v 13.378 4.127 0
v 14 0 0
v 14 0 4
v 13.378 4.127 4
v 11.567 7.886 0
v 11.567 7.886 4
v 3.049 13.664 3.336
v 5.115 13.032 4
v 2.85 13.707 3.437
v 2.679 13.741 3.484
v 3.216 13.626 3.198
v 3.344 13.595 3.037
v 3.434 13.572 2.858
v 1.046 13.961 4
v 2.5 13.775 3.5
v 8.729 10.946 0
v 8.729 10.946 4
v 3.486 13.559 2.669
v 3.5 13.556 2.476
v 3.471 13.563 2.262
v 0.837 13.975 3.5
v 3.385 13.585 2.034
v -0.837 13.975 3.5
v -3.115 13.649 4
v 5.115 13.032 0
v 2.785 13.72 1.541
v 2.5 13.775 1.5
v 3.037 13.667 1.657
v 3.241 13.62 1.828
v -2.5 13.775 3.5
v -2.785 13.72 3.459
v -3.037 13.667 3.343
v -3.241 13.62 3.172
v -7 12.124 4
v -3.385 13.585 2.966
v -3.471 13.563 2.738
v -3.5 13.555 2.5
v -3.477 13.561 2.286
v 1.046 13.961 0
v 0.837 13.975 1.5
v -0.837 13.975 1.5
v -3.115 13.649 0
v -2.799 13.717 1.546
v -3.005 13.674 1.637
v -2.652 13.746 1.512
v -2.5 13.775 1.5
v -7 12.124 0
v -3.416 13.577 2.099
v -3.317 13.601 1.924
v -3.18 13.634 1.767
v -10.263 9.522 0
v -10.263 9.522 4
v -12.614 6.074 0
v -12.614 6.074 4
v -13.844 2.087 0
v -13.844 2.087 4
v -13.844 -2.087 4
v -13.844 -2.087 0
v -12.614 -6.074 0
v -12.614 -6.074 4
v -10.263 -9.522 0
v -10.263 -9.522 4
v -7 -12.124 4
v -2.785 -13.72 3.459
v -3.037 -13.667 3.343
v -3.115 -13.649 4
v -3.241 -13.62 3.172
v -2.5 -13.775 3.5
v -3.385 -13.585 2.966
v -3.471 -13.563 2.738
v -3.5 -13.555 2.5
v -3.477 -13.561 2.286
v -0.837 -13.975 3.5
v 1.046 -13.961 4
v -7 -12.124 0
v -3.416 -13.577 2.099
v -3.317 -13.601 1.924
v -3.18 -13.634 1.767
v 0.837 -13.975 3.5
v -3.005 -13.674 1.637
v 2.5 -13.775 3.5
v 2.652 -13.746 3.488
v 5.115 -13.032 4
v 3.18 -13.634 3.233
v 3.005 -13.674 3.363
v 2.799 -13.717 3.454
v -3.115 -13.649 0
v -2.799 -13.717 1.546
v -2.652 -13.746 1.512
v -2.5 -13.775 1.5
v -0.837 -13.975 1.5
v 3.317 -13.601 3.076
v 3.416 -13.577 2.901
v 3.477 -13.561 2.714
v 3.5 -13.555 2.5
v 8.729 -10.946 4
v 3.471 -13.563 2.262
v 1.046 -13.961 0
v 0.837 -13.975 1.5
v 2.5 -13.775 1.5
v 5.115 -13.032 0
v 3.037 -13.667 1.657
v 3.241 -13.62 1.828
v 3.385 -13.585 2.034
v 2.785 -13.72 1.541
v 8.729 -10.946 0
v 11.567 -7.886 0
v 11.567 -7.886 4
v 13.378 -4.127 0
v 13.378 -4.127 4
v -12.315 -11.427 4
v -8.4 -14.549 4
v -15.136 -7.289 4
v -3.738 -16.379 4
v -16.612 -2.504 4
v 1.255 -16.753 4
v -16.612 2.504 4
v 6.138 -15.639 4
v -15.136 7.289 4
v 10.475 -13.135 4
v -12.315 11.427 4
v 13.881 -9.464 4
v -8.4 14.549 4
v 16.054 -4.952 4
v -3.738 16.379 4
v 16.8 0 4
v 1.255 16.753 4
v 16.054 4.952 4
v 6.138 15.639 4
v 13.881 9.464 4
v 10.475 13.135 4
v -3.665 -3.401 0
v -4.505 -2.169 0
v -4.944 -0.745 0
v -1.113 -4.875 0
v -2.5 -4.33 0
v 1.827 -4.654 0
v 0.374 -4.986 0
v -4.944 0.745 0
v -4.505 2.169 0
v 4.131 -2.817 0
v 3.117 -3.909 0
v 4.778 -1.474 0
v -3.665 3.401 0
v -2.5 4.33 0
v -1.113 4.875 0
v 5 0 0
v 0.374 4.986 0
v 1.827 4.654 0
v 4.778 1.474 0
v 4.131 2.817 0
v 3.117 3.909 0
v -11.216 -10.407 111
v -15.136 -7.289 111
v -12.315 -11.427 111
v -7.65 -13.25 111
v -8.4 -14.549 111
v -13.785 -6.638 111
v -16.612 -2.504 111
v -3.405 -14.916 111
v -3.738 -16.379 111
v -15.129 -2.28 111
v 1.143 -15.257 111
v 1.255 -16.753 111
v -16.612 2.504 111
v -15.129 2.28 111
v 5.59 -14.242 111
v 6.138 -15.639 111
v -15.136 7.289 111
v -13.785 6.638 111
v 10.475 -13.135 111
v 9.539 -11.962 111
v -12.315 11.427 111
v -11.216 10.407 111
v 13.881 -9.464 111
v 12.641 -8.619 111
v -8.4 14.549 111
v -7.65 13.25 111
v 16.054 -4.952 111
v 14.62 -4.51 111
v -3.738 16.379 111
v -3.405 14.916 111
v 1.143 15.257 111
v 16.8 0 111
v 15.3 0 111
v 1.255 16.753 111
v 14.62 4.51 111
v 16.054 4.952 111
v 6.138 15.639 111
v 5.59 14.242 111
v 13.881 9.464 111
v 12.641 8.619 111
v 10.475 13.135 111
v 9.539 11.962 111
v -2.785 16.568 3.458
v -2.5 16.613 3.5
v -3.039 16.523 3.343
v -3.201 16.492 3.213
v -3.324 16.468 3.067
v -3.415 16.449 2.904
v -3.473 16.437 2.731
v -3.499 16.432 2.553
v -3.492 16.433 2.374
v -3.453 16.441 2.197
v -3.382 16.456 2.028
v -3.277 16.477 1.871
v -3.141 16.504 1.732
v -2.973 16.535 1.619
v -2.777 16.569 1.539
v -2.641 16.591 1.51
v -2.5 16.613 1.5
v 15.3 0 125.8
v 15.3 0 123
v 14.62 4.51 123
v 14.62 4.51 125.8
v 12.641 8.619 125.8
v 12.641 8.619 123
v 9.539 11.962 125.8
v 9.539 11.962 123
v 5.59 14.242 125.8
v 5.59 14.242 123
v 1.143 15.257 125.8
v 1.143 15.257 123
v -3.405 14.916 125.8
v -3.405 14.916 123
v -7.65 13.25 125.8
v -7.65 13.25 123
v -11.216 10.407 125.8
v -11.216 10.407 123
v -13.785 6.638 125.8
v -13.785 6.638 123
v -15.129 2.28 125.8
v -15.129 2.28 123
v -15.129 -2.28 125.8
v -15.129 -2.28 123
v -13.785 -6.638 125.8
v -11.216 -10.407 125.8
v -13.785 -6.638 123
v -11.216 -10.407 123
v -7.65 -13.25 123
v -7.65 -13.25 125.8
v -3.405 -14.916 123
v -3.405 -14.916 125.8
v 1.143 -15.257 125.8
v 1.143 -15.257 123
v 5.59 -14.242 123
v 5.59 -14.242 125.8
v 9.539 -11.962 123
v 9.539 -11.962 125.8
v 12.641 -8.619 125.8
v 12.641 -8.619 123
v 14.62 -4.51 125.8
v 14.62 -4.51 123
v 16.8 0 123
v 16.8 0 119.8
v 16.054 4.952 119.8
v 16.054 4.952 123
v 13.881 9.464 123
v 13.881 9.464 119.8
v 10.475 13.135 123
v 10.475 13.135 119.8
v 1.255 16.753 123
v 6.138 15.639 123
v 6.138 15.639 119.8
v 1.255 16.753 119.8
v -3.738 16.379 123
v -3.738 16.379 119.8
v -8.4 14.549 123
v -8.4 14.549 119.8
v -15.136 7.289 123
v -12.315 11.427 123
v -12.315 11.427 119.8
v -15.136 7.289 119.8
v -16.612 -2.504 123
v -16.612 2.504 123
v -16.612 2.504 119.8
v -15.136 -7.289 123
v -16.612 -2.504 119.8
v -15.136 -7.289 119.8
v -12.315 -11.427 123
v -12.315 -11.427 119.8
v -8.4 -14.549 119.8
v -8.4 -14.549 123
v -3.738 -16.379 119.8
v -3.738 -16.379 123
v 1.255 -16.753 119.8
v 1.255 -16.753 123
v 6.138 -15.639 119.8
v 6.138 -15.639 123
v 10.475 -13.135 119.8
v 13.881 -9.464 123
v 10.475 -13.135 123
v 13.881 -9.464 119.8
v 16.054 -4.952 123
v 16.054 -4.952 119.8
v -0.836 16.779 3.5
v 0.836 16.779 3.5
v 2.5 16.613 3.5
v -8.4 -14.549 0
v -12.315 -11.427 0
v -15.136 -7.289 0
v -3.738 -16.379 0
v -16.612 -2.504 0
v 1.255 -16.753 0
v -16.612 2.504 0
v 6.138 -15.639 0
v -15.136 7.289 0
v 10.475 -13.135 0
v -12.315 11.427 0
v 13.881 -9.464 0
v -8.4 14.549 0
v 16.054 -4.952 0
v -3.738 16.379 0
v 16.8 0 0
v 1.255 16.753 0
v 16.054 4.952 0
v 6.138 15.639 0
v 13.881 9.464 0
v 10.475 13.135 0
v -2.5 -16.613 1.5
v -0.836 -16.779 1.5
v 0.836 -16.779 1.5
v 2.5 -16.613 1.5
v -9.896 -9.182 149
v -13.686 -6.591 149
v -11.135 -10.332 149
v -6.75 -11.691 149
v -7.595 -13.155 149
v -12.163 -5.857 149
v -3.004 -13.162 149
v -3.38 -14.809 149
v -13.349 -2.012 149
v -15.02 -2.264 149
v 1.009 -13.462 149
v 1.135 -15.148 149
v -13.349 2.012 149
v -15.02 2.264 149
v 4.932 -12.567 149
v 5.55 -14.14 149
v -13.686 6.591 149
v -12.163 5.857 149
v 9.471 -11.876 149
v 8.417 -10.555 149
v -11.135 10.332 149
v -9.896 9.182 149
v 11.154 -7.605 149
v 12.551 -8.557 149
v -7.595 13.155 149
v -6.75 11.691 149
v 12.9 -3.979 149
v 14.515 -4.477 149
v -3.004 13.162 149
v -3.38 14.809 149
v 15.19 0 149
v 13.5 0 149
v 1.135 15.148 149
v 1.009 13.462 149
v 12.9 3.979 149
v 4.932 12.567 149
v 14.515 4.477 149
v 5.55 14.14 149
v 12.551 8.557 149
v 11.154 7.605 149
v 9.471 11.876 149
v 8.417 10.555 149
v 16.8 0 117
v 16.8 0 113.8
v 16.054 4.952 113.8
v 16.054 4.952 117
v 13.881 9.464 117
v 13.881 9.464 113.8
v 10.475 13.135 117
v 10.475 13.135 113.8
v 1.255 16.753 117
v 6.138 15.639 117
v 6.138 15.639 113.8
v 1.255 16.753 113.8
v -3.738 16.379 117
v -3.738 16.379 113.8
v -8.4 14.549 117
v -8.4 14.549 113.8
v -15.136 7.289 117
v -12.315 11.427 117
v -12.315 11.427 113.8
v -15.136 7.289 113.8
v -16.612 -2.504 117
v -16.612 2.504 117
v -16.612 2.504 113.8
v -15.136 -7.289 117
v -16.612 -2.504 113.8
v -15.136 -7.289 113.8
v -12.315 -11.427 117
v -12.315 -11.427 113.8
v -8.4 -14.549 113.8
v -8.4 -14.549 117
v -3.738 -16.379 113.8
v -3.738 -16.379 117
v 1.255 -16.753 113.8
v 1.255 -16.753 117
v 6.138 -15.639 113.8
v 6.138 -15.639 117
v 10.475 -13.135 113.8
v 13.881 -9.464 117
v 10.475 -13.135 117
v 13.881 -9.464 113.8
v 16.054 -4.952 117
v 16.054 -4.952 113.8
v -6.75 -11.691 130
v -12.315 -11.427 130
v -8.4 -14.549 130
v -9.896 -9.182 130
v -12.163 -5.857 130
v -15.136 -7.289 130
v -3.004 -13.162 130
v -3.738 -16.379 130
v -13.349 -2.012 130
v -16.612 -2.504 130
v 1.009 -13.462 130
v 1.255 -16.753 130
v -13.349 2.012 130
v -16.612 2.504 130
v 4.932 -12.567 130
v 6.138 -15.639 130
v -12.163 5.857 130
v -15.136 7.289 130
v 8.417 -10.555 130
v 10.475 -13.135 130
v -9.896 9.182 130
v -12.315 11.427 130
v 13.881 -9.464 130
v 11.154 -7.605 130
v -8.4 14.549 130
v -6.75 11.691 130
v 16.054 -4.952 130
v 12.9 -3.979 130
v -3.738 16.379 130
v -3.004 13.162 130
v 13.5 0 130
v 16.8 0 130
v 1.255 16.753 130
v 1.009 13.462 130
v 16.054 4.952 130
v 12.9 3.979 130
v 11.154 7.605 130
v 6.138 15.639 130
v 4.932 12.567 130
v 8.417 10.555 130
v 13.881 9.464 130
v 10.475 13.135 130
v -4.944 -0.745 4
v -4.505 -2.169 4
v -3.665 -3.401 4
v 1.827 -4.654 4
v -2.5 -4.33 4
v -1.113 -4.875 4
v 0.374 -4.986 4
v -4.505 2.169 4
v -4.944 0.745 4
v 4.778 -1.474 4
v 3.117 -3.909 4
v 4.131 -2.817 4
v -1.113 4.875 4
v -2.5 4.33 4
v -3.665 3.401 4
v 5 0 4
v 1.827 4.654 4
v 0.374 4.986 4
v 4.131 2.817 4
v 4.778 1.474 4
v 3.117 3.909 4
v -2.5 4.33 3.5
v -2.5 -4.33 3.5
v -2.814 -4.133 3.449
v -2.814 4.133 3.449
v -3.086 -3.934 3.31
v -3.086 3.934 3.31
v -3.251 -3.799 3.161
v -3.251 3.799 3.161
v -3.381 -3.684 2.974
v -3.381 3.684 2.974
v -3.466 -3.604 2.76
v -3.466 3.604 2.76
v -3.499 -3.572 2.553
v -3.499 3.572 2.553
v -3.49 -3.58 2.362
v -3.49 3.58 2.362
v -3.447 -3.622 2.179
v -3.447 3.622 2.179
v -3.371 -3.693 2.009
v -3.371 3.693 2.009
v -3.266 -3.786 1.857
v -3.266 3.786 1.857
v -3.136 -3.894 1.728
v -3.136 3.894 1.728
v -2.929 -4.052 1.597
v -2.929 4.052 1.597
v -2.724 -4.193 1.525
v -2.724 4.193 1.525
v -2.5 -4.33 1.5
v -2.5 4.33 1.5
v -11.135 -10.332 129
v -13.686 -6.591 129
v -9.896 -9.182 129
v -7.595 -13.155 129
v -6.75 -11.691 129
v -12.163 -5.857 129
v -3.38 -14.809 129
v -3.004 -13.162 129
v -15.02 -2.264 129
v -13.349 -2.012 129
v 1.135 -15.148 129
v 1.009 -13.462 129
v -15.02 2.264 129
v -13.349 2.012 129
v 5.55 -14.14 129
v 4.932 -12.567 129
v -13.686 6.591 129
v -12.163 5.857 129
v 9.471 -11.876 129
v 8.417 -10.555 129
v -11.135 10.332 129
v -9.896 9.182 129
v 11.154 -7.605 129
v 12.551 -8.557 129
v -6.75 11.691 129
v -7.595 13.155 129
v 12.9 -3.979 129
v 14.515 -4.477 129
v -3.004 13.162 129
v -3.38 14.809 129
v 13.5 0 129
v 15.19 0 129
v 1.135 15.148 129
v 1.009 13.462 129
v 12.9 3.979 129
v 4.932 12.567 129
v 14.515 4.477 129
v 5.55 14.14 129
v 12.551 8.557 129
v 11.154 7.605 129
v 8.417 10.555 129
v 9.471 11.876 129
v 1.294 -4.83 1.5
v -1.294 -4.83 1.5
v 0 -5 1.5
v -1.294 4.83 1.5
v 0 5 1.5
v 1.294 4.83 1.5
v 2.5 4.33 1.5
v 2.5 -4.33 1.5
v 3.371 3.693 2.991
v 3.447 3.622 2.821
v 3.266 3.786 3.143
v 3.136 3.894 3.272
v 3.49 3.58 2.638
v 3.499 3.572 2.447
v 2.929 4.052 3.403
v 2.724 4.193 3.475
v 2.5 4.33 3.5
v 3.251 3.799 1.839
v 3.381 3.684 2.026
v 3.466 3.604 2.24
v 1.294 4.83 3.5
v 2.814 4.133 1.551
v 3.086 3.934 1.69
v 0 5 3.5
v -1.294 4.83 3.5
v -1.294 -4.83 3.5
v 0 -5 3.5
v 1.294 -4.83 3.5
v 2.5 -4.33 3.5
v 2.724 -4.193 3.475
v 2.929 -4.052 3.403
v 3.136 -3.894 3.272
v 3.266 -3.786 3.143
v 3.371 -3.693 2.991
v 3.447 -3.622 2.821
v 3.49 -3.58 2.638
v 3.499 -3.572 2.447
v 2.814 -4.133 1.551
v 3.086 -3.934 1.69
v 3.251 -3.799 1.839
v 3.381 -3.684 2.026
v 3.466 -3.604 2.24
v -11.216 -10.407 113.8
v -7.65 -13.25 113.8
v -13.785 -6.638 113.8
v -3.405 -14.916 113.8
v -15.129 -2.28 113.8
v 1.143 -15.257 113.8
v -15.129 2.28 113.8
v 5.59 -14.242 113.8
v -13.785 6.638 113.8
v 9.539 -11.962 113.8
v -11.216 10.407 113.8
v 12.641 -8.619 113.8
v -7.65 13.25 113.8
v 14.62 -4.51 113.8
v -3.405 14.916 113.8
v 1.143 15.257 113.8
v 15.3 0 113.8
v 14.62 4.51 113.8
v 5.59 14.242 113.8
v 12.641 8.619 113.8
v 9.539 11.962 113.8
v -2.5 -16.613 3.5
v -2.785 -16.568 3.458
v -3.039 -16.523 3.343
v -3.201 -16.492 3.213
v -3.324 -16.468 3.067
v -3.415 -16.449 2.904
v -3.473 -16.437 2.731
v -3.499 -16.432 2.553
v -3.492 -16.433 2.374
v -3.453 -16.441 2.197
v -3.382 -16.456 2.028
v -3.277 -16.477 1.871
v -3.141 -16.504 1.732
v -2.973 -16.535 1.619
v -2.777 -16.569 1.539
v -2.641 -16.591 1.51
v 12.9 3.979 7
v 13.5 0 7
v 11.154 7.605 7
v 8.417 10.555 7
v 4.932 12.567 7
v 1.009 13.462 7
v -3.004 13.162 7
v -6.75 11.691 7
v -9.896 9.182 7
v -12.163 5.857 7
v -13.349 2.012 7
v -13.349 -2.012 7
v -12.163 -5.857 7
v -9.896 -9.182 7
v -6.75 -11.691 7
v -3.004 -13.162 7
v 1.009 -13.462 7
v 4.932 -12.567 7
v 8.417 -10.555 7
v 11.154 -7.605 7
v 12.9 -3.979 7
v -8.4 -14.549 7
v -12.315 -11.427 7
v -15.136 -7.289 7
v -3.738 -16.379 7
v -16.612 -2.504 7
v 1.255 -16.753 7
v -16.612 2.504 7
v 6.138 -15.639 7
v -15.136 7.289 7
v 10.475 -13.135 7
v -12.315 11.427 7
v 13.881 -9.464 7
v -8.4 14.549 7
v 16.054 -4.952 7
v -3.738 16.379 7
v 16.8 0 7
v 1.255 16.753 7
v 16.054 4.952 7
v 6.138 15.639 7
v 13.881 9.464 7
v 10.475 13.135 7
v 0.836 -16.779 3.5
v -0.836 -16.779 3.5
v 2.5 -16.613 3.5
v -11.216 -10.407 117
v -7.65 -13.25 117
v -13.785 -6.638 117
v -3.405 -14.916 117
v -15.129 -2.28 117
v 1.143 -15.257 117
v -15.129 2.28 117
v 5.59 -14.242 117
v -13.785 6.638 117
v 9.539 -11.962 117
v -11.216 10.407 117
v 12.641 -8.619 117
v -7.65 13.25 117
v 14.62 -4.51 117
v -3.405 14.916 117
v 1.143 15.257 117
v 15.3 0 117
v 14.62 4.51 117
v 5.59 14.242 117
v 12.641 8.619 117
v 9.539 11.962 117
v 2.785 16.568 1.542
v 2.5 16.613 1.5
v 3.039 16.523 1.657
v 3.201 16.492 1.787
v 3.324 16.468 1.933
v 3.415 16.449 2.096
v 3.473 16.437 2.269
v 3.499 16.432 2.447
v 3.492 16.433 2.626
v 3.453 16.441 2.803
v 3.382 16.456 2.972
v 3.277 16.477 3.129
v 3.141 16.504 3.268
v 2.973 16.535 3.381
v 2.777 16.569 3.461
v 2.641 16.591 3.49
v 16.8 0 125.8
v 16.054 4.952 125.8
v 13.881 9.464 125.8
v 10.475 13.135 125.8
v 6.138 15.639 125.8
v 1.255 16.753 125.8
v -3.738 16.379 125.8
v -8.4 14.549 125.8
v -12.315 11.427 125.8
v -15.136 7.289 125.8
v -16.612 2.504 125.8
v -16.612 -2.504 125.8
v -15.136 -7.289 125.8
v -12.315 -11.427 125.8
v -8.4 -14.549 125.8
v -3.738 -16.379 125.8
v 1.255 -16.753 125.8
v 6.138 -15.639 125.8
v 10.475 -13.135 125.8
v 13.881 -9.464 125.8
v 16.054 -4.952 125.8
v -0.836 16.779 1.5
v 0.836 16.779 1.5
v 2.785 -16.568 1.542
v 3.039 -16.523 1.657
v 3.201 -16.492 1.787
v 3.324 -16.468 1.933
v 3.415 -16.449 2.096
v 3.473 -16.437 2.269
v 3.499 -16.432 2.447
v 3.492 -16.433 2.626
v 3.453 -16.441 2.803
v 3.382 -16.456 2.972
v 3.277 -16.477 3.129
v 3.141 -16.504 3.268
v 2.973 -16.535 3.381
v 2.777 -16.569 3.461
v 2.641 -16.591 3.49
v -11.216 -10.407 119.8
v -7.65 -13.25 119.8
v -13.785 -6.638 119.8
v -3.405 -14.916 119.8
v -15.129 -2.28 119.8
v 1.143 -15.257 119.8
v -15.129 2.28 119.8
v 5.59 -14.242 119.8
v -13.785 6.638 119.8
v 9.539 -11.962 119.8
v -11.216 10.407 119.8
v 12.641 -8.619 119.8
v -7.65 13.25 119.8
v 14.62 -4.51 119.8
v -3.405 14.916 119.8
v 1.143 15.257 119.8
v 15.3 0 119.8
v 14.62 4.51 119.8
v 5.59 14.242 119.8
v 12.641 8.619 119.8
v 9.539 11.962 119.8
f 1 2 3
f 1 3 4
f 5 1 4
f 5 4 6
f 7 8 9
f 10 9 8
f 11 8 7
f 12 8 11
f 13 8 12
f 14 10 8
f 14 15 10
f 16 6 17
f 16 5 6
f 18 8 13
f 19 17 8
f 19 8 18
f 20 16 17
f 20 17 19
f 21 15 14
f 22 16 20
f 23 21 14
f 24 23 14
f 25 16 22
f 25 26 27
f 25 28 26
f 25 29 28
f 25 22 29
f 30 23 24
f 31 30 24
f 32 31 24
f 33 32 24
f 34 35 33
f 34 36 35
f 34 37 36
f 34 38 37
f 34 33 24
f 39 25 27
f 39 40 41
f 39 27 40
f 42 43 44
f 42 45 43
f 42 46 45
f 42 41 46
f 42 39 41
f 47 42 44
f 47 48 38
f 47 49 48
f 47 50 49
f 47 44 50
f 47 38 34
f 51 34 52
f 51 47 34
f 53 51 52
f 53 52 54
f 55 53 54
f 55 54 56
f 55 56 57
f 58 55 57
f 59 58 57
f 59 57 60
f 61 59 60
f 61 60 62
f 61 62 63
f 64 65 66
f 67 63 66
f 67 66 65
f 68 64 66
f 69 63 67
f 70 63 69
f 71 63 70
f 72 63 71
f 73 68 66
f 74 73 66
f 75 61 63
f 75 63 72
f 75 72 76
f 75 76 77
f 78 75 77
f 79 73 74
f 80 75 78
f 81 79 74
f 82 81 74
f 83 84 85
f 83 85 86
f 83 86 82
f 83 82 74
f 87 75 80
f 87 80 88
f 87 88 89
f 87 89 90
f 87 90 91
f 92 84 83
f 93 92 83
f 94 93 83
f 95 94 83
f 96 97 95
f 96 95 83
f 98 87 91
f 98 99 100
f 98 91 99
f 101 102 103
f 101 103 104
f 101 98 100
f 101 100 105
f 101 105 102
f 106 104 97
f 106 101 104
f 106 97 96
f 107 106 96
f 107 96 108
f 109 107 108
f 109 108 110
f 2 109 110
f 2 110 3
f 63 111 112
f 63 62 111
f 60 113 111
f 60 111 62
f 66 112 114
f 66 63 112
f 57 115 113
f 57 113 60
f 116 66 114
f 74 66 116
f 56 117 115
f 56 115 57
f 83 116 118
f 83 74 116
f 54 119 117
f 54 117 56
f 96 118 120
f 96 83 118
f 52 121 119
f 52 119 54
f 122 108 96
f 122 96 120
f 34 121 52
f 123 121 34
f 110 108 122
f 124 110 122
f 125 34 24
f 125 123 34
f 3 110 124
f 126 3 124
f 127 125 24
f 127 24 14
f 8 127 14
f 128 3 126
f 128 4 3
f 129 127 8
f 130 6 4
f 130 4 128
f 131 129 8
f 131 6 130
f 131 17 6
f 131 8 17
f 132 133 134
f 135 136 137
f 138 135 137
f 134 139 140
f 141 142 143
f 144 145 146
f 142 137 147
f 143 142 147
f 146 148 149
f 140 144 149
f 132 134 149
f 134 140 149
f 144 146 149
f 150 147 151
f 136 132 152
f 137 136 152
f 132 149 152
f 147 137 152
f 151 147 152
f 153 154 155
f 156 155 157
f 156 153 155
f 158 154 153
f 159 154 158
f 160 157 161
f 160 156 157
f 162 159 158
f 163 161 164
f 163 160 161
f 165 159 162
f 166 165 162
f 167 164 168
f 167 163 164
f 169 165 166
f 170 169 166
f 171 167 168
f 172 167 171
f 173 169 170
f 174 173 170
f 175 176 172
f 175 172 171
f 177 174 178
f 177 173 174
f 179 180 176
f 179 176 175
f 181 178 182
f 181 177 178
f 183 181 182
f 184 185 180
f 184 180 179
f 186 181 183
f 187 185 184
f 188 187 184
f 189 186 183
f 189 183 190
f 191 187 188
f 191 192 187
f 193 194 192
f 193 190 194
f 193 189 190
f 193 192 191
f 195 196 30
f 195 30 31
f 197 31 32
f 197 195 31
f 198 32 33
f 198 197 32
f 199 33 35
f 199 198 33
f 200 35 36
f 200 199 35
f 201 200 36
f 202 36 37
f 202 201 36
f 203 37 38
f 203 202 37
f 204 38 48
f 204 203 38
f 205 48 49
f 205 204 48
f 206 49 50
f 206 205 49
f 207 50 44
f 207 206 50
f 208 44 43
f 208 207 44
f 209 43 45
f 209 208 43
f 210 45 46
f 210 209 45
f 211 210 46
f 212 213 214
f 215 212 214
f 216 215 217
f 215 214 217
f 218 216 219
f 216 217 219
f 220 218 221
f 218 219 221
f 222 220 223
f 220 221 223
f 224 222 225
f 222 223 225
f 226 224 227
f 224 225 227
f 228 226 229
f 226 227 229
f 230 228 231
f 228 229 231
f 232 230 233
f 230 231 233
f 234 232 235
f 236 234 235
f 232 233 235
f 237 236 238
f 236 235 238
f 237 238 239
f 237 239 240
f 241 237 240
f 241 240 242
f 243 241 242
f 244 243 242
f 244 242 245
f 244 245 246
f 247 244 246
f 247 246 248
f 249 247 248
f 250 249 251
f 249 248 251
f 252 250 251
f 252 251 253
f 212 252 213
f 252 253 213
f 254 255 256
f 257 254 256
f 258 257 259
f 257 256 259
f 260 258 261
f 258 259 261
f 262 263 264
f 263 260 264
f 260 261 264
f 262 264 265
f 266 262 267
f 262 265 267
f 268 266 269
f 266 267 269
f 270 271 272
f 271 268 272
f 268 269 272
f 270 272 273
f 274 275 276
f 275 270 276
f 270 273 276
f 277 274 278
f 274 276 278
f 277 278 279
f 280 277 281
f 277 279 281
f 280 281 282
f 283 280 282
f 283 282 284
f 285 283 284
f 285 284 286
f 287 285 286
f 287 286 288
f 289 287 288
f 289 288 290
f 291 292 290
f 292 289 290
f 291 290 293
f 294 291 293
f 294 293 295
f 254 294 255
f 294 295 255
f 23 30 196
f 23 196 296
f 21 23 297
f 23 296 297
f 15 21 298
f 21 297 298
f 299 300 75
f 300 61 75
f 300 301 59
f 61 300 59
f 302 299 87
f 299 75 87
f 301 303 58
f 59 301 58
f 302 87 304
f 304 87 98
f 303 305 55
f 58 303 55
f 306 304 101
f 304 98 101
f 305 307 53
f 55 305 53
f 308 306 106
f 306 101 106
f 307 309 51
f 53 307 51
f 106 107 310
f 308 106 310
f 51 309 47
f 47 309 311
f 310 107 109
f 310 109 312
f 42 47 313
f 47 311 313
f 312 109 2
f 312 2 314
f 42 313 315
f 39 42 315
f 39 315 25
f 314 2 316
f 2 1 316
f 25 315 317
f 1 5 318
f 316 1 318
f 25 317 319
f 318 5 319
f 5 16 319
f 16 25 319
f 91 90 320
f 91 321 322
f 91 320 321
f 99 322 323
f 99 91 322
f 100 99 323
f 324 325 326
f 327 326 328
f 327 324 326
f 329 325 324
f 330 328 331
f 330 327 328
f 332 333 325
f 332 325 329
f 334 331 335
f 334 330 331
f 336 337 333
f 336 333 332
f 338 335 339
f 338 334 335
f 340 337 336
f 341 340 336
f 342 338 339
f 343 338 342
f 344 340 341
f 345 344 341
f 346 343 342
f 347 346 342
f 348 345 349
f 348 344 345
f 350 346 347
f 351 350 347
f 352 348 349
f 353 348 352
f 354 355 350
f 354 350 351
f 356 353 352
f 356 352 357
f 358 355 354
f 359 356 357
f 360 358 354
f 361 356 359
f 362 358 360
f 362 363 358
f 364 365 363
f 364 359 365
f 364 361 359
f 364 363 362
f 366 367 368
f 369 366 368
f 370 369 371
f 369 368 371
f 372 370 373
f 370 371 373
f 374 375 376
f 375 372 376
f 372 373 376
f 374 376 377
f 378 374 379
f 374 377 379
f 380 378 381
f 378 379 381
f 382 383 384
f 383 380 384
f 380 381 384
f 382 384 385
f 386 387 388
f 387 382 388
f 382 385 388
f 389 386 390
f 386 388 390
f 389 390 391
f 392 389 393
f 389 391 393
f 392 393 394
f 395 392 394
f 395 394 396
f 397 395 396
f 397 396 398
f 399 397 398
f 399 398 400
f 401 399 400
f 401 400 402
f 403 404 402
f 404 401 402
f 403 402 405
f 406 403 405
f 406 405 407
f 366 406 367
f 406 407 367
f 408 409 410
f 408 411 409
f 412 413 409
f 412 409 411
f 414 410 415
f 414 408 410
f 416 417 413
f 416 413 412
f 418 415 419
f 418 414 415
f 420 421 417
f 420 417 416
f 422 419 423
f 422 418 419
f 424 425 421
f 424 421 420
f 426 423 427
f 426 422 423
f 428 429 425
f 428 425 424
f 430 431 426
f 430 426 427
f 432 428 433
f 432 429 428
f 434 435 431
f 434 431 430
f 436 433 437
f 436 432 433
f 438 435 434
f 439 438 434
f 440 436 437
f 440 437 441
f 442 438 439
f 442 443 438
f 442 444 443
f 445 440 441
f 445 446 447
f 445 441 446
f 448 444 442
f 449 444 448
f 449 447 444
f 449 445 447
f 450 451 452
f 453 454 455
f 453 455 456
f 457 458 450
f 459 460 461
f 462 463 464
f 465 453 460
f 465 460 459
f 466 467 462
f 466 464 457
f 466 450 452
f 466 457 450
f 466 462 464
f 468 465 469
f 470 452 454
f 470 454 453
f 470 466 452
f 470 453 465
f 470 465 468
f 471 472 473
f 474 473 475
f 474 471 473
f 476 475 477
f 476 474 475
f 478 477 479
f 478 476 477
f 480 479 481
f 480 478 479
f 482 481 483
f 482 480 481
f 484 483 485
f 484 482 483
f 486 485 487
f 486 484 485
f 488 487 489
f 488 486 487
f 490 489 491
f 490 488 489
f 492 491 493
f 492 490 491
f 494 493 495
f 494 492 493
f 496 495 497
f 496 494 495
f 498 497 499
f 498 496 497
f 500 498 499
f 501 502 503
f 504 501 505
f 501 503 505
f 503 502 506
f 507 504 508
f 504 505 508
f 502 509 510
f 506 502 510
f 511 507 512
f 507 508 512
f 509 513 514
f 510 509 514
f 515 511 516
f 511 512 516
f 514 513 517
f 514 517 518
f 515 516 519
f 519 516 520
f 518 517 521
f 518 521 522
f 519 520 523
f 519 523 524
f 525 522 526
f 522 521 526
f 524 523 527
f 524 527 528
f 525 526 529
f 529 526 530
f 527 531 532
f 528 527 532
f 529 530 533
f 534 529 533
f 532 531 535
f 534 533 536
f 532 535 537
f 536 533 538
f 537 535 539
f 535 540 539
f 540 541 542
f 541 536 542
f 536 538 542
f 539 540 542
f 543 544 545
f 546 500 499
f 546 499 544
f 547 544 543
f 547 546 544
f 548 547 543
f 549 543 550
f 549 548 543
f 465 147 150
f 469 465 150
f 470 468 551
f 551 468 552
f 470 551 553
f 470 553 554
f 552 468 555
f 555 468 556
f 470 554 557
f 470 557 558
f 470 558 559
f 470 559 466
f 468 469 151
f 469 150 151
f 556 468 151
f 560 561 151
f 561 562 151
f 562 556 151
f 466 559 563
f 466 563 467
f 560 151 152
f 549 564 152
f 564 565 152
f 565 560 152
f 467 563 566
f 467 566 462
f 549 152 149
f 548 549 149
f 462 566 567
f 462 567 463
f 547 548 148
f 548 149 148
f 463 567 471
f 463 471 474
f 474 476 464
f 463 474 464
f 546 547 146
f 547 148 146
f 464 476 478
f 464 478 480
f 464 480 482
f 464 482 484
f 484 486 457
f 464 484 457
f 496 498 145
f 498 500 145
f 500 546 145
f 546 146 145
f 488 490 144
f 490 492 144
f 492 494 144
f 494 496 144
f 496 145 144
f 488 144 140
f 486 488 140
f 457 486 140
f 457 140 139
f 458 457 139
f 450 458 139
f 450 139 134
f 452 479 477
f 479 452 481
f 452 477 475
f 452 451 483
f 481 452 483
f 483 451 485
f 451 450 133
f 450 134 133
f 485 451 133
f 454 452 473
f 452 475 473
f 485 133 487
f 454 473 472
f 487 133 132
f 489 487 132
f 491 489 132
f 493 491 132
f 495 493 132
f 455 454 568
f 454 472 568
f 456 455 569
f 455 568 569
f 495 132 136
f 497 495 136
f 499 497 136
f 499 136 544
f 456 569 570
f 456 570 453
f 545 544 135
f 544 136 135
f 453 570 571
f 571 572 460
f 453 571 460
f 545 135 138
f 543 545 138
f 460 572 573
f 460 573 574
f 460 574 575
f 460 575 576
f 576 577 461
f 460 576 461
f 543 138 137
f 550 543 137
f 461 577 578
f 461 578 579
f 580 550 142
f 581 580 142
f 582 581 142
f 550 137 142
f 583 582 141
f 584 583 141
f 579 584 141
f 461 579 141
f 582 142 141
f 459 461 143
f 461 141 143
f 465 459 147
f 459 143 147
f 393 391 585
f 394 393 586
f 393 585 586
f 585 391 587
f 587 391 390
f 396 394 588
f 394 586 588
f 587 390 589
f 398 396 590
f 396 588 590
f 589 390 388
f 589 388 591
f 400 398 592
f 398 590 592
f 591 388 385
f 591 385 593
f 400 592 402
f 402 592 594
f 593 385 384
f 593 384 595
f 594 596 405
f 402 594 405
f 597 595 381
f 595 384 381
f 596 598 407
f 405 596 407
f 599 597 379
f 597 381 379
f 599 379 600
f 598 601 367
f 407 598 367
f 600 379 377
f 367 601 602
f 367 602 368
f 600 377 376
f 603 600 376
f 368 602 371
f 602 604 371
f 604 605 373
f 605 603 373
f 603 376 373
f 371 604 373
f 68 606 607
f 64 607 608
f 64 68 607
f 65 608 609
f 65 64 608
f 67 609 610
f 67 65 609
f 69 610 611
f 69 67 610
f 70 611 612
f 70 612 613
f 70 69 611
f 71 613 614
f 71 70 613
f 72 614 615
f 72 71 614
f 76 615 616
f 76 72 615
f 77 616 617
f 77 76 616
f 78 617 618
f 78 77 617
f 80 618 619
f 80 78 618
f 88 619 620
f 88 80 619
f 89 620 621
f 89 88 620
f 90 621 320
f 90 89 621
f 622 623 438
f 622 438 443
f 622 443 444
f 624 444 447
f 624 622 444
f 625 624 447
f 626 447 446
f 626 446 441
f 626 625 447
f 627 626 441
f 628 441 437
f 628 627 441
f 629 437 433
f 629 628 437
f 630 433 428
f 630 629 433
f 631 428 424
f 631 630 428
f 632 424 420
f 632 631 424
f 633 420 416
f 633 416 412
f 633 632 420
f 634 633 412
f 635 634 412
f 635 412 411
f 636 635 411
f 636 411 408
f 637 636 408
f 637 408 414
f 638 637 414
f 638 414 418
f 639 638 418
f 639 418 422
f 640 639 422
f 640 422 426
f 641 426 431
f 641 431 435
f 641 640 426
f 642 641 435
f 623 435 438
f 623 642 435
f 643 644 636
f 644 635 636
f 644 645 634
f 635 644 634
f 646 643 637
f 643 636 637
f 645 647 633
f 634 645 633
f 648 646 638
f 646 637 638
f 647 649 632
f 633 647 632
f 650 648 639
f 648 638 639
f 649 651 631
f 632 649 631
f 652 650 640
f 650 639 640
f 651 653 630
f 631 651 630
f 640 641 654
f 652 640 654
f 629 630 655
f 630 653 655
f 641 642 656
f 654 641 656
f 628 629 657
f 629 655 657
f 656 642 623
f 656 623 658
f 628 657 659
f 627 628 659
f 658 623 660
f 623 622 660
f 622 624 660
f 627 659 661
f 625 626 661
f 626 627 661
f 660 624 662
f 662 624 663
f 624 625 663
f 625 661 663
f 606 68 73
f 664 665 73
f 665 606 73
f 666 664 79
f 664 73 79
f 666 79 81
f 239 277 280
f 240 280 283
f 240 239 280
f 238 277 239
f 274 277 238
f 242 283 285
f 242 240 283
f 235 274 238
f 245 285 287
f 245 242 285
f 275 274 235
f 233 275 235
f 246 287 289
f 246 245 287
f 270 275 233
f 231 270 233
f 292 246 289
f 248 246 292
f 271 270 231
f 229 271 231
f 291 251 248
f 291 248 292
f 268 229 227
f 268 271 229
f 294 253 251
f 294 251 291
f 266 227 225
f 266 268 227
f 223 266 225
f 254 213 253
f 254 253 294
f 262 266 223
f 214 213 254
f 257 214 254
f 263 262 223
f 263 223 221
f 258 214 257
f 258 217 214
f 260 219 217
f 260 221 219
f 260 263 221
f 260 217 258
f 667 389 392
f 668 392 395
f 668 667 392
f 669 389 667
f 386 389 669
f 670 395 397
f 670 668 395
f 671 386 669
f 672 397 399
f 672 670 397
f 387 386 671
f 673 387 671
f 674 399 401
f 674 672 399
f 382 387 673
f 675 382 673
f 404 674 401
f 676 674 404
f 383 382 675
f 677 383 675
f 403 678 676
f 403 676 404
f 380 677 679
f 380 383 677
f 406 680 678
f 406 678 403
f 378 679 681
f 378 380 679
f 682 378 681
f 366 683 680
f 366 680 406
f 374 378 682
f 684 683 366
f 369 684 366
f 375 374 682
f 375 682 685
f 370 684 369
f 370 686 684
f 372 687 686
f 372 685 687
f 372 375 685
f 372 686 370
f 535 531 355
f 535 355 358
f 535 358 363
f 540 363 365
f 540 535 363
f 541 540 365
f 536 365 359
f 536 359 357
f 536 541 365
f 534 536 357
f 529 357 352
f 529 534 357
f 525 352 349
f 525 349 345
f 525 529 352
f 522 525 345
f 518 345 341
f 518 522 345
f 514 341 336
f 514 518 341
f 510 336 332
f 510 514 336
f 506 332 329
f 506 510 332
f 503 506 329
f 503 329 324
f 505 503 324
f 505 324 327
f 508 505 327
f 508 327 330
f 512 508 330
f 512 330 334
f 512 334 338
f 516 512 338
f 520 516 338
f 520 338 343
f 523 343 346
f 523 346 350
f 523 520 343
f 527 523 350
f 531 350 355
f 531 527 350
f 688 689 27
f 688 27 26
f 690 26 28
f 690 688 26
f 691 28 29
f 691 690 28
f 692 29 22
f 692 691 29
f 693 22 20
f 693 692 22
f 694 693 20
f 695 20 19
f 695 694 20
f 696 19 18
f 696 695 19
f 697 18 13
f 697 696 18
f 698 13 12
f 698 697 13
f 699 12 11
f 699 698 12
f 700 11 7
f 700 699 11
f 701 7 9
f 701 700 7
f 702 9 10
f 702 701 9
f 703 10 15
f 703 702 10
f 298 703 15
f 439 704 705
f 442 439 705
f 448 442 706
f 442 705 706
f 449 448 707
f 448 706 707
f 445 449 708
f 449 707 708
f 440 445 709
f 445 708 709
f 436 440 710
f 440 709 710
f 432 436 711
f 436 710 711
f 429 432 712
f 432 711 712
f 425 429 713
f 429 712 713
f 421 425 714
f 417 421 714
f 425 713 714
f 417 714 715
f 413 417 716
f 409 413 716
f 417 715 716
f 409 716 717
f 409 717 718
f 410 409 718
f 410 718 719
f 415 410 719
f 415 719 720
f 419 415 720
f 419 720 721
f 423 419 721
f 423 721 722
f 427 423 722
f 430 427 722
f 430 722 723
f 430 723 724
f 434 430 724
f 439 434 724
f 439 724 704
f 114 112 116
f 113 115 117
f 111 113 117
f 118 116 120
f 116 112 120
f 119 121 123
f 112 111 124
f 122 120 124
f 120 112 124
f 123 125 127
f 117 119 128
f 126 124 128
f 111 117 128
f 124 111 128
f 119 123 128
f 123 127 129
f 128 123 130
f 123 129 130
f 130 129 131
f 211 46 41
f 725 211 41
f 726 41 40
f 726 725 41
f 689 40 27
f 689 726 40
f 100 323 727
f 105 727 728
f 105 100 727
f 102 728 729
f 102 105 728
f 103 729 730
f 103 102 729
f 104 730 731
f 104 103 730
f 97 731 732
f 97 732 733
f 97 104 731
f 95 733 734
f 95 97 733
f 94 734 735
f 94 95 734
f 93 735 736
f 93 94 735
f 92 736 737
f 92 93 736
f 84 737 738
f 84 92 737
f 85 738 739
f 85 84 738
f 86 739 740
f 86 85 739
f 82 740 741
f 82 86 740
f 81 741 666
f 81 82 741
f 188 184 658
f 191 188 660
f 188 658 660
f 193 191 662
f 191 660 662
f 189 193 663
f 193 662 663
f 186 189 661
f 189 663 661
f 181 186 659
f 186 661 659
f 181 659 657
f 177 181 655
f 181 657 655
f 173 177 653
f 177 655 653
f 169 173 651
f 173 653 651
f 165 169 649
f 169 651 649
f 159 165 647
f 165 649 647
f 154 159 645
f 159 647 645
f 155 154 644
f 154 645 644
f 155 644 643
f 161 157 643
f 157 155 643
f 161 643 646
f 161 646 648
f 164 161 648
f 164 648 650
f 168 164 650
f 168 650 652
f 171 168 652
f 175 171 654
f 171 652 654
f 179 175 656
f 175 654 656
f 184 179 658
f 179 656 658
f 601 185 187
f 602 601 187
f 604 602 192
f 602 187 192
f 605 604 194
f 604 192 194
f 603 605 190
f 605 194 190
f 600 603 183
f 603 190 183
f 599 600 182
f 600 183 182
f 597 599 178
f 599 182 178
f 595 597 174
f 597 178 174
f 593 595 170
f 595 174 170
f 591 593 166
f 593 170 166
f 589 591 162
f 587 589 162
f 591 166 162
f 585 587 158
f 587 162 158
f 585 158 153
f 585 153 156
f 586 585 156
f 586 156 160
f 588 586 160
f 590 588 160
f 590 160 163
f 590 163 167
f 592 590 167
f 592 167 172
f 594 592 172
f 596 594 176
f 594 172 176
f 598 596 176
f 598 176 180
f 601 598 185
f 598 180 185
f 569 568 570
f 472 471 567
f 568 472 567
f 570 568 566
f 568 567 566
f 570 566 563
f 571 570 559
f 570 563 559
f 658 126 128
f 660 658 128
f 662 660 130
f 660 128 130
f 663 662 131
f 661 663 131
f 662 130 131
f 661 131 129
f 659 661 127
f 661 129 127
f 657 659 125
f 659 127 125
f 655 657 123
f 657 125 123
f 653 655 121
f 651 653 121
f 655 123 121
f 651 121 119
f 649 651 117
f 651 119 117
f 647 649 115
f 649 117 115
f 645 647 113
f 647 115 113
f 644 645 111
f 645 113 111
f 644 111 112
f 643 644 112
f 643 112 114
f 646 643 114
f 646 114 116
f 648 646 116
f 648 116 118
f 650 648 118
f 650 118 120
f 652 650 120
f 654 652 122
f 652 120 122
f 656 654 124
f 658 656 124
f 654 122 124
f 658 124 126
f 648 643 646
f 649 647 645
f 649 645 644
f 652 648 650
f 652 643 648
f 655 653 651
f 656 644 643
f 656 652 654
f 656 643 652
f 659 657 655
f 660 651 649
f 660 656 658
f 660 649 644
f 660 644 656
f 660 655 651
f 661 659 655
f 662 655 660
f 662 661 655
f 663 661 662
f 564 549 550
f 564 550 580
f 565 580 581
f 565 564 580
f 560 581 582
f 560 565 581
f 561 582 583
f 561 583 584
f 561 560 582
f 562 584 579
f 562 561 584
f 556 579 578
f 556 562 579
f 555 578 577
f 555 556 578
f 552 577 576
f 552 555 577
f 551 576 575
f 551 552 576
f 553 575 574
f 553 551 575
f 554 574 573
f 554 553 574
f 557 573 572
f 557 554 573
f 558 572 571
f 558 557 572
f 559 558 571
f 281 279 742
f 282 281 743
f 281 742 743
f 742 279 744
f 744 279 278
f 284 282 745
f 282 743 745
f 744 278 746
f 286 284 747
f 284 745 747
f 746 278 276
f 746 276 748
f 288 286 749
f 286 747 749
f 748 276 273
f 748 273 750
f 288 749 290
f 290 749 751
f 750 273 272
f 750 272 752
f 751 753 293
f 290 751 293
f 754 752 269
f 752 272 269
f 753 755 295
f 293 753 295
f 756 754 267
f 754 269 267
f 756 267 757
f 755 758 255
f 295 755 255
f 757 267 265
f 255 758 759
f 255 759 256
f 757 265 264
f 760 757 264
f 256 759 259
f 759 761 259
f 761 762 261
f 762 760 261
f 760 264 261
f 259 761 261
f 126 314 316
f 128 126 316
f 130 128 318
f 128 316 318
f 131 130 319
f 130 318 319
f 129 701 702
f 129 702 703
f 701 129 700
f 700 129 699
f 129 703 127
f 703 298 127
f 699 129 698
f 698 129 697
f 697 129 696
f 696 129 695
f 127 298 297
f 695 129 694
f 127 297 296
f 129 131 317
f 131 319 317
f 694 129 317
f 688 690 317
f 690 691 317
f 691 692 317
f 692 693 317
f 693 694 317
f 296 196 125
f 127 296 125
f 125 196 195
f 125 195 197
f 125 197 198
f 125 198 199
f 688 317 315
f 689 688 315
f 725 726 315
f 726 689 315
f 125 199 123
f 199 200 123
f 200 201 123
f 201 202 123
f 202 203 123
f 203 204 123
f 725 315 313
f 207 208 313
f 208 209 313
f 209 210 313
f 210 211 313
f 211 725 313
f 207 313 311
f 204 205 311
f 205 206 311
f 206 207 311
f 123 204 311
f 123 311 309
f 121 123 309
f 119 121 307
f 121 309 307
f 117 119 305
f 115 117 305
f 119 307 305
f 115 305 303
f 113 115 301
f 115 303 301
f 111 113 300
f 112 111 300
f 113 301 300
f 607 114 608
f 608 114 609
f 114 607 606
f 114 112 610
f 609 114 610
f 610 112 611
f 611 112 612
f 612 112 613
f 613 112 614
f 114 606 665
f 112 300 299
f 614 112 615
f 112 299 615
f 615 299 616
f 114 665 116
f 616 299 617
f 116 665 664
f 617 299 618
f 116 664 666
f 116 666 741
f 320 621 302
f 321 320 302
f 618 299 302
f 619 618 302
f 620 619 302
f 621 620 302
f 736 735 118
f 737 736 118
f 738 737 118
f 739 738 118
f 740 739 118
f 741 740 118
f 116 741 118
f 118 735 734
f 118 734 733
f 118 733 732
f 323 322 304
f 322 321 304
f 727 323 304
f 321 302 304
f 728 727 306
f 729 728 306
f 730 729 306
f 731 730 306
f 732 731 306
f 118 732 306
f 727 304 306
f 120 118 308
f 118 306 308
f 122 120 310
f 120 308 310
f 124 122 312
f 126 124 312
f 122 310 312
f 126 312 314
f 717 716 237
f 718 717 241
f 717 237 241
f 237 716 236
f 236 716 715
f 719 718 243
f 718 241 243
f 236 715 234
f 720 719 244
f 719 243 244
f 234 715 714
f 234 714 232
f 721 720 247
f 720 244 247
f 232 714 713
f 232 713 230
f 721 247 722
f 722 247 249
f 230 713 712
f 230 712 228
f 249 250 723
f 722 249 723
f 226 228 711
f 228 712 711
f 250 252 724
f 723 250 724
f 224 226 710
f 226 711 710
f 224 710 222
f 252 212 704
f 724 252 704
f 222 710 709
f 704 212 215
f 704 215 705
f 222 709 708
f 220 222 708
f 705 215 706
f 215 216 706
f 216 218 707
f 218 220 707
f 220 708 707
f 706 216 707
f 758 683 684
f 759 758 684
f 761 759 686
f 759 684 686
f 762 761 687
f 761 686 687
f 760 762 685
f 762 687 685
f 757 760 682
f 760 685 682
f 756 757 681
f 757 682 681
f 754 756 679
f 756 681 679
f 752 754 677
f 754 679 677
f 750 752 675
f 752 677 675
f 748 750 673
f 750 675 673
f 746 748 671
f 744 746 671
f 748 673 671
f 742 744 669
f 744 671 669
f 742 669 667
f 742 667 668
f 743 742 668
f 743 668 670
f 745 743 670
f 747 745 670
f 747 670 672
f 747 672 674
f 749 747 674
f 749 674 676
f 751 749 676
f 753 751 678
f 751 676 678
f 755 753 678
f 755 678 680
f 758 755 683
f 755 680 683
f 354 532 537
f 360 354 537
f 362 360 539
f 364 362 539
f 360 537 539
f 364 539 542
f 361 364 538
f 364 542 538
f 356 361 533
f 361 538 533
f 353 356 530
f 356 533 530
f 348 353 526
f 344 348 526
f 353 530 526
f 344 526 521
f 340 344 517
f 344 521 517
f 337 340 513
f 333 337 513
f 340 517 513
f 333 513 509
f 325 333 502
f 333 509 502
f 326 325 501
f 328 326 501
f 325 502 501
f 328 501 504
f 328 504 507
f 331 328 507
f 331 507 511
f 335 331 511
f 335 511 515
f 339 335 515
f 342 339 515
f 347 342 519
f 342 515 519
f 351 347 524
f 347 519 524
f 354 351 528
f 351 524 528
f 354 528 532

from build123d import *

# Parameters (mm, degrees)
SKETCH005_R    = 16.8
PAD004_DEPTH   = 3
PAD003_DEPTH   = 40
CYLINDER_R     = 5
CYLINDER_DEPTH = 4
SKETCH_R       = 16.8
SKETCH_R_2     = 14
PAD_DEPTH      = 4
SKETCH007_R    = 20
SKETCH007_R_2  = 15.3
PAD005_DEPTH   = 2.8
SKETCH008_R    = 20
SKETCH008_R_2  = 15.3
PAD006_DEPTH   = 2.8
SKETCH009_R    = 20
SKETCH009_R_2  = 15.3
PAD007_DEPTH   = 2.8
SKETCH002_R    = 16.8
SKETCH002_R_2  = 13.5
PAD002_DEPTH   = 123
SKETCH010_R    = 15.19
SKETCH010_R_2  = 13.5
PAD008_DEPTH   = 20


with BuildPart() as boden:
    # Sketch005 → Pad004 (new body)
    with BuildSketch(Plane.XY.offset(4)):
        Circle(SKETCH005_R)
    extrude(amount=PAD004_DEPTH)


with BuildPart() as langloch_boltsnap:
    # Sketch004 → Pad003 (new body)
    with BuildSketch(Plane(origin=(0, 20, 1.5), x_dir=(1, 0, 0), z_dir=(0, -1, 0))):
        with BuildLine():
            ThreePointArc((-2.5, 2), (-3.5, 1), (-2.5, 0))
            Line((-2.5, 0), (2.5, 0))
            ThreePointArc((2.5, 0), (3.5, 1), (2.5, 2))
            Line((-2.5, 2), (2.5, 2))
        make_face()
    extrude(amount=PAD003_DEPTH)


with BuildPart() as cut001:
    # Cylinder → Cylinder (new body)
    with BuildSketch(Plane.XY):
        Circle(CYLINDER_R)
    extrude(amount=CYLINDER_DEPTH)

    # Cut001: cut Langloch Boltsnap
    add(langloch_boltsnap.part, mode=Mode.SUBTRACT)


with BuildPart() as cut_se_boltsnap001:
    # Sketch → Pad (new body)
    with BuildSketch(Plane.XY):
        Circle(SKETCH_R)
        Circle(SKETCH_R_2, mode=Mode.SUBTRACT)
    extrude(amount=PAD_DEPTH)

    # Cut: cut Langloch Boltsnap
    add(langloch_boltsnap.part, mode=Mode.SUBTRACT)

    # Fusion: union Cut001
    add(cut001.part)


with BuildPart() as pad005:
    # Sketch007 → Pad005 (new body)
    with BuildSketch(Plane.XY.offset(123)):
        Circle(SKETCH007_R)
        Circle(SKETCH007_R_2, mode=Mode.SUBTRACT)
    extrude(amount=PAD005_DEPTH)


with BuildPart() as fusion001:
    # Sketch008 → Pad006 (new body)
    with BuildSketch(Plane.XY.offset(117)):
        Circle(SKETCH008_R)
        Circle(SKETCH008_R_2, mode=Mode.SUBTRACT)
    extrude(amount=PAD006_DEPTH)

    # Fusion001: union Pad005
    add(pad005.part)


with BuildPart() as oring_nuten:
    # Sketch009 → Pad007 (new body)
    with BuildSketch(Plane.XY.offset(111)):
        Circle(SKETCH009_R)
        Circle(SKETCH009_R_2, mode=Mode.SUBTRACT)
    extrude(amount=PAD007_DEPTH)

    # Fusion002: union Fusion001
    add(fusion001.part)


with BuildPart() as cut002:
    # Sketch002 → Pad002 (new body)
    with BuildSketch(Plane.XY.offset(7)):
        Circle(SKETCH002_R)
        Circle(SKETCH002_R_2, mode=Mode.SUBTRACT)
    extrude(amount=PAD002_DEPTH)

    # Cut002: cut ORing Nuten
    add(oring_nuten.part, mode=Mode.SUBTRACT)


with BuildPart() as pad008:
    # Sketch010 → Pad008 (new body)
    with BuildSketch(Plane.XY.offset(129)):
        Circle(SKETCH010_R)
        Circle(SKETCH010_R_2, mode=Mode.SUBTRACT)
    extrude(amount=PAD008_DEPTH)


solid = Compound([boden.part, cut_se_boltsnap001.part, cut002.part, pad008.part])
